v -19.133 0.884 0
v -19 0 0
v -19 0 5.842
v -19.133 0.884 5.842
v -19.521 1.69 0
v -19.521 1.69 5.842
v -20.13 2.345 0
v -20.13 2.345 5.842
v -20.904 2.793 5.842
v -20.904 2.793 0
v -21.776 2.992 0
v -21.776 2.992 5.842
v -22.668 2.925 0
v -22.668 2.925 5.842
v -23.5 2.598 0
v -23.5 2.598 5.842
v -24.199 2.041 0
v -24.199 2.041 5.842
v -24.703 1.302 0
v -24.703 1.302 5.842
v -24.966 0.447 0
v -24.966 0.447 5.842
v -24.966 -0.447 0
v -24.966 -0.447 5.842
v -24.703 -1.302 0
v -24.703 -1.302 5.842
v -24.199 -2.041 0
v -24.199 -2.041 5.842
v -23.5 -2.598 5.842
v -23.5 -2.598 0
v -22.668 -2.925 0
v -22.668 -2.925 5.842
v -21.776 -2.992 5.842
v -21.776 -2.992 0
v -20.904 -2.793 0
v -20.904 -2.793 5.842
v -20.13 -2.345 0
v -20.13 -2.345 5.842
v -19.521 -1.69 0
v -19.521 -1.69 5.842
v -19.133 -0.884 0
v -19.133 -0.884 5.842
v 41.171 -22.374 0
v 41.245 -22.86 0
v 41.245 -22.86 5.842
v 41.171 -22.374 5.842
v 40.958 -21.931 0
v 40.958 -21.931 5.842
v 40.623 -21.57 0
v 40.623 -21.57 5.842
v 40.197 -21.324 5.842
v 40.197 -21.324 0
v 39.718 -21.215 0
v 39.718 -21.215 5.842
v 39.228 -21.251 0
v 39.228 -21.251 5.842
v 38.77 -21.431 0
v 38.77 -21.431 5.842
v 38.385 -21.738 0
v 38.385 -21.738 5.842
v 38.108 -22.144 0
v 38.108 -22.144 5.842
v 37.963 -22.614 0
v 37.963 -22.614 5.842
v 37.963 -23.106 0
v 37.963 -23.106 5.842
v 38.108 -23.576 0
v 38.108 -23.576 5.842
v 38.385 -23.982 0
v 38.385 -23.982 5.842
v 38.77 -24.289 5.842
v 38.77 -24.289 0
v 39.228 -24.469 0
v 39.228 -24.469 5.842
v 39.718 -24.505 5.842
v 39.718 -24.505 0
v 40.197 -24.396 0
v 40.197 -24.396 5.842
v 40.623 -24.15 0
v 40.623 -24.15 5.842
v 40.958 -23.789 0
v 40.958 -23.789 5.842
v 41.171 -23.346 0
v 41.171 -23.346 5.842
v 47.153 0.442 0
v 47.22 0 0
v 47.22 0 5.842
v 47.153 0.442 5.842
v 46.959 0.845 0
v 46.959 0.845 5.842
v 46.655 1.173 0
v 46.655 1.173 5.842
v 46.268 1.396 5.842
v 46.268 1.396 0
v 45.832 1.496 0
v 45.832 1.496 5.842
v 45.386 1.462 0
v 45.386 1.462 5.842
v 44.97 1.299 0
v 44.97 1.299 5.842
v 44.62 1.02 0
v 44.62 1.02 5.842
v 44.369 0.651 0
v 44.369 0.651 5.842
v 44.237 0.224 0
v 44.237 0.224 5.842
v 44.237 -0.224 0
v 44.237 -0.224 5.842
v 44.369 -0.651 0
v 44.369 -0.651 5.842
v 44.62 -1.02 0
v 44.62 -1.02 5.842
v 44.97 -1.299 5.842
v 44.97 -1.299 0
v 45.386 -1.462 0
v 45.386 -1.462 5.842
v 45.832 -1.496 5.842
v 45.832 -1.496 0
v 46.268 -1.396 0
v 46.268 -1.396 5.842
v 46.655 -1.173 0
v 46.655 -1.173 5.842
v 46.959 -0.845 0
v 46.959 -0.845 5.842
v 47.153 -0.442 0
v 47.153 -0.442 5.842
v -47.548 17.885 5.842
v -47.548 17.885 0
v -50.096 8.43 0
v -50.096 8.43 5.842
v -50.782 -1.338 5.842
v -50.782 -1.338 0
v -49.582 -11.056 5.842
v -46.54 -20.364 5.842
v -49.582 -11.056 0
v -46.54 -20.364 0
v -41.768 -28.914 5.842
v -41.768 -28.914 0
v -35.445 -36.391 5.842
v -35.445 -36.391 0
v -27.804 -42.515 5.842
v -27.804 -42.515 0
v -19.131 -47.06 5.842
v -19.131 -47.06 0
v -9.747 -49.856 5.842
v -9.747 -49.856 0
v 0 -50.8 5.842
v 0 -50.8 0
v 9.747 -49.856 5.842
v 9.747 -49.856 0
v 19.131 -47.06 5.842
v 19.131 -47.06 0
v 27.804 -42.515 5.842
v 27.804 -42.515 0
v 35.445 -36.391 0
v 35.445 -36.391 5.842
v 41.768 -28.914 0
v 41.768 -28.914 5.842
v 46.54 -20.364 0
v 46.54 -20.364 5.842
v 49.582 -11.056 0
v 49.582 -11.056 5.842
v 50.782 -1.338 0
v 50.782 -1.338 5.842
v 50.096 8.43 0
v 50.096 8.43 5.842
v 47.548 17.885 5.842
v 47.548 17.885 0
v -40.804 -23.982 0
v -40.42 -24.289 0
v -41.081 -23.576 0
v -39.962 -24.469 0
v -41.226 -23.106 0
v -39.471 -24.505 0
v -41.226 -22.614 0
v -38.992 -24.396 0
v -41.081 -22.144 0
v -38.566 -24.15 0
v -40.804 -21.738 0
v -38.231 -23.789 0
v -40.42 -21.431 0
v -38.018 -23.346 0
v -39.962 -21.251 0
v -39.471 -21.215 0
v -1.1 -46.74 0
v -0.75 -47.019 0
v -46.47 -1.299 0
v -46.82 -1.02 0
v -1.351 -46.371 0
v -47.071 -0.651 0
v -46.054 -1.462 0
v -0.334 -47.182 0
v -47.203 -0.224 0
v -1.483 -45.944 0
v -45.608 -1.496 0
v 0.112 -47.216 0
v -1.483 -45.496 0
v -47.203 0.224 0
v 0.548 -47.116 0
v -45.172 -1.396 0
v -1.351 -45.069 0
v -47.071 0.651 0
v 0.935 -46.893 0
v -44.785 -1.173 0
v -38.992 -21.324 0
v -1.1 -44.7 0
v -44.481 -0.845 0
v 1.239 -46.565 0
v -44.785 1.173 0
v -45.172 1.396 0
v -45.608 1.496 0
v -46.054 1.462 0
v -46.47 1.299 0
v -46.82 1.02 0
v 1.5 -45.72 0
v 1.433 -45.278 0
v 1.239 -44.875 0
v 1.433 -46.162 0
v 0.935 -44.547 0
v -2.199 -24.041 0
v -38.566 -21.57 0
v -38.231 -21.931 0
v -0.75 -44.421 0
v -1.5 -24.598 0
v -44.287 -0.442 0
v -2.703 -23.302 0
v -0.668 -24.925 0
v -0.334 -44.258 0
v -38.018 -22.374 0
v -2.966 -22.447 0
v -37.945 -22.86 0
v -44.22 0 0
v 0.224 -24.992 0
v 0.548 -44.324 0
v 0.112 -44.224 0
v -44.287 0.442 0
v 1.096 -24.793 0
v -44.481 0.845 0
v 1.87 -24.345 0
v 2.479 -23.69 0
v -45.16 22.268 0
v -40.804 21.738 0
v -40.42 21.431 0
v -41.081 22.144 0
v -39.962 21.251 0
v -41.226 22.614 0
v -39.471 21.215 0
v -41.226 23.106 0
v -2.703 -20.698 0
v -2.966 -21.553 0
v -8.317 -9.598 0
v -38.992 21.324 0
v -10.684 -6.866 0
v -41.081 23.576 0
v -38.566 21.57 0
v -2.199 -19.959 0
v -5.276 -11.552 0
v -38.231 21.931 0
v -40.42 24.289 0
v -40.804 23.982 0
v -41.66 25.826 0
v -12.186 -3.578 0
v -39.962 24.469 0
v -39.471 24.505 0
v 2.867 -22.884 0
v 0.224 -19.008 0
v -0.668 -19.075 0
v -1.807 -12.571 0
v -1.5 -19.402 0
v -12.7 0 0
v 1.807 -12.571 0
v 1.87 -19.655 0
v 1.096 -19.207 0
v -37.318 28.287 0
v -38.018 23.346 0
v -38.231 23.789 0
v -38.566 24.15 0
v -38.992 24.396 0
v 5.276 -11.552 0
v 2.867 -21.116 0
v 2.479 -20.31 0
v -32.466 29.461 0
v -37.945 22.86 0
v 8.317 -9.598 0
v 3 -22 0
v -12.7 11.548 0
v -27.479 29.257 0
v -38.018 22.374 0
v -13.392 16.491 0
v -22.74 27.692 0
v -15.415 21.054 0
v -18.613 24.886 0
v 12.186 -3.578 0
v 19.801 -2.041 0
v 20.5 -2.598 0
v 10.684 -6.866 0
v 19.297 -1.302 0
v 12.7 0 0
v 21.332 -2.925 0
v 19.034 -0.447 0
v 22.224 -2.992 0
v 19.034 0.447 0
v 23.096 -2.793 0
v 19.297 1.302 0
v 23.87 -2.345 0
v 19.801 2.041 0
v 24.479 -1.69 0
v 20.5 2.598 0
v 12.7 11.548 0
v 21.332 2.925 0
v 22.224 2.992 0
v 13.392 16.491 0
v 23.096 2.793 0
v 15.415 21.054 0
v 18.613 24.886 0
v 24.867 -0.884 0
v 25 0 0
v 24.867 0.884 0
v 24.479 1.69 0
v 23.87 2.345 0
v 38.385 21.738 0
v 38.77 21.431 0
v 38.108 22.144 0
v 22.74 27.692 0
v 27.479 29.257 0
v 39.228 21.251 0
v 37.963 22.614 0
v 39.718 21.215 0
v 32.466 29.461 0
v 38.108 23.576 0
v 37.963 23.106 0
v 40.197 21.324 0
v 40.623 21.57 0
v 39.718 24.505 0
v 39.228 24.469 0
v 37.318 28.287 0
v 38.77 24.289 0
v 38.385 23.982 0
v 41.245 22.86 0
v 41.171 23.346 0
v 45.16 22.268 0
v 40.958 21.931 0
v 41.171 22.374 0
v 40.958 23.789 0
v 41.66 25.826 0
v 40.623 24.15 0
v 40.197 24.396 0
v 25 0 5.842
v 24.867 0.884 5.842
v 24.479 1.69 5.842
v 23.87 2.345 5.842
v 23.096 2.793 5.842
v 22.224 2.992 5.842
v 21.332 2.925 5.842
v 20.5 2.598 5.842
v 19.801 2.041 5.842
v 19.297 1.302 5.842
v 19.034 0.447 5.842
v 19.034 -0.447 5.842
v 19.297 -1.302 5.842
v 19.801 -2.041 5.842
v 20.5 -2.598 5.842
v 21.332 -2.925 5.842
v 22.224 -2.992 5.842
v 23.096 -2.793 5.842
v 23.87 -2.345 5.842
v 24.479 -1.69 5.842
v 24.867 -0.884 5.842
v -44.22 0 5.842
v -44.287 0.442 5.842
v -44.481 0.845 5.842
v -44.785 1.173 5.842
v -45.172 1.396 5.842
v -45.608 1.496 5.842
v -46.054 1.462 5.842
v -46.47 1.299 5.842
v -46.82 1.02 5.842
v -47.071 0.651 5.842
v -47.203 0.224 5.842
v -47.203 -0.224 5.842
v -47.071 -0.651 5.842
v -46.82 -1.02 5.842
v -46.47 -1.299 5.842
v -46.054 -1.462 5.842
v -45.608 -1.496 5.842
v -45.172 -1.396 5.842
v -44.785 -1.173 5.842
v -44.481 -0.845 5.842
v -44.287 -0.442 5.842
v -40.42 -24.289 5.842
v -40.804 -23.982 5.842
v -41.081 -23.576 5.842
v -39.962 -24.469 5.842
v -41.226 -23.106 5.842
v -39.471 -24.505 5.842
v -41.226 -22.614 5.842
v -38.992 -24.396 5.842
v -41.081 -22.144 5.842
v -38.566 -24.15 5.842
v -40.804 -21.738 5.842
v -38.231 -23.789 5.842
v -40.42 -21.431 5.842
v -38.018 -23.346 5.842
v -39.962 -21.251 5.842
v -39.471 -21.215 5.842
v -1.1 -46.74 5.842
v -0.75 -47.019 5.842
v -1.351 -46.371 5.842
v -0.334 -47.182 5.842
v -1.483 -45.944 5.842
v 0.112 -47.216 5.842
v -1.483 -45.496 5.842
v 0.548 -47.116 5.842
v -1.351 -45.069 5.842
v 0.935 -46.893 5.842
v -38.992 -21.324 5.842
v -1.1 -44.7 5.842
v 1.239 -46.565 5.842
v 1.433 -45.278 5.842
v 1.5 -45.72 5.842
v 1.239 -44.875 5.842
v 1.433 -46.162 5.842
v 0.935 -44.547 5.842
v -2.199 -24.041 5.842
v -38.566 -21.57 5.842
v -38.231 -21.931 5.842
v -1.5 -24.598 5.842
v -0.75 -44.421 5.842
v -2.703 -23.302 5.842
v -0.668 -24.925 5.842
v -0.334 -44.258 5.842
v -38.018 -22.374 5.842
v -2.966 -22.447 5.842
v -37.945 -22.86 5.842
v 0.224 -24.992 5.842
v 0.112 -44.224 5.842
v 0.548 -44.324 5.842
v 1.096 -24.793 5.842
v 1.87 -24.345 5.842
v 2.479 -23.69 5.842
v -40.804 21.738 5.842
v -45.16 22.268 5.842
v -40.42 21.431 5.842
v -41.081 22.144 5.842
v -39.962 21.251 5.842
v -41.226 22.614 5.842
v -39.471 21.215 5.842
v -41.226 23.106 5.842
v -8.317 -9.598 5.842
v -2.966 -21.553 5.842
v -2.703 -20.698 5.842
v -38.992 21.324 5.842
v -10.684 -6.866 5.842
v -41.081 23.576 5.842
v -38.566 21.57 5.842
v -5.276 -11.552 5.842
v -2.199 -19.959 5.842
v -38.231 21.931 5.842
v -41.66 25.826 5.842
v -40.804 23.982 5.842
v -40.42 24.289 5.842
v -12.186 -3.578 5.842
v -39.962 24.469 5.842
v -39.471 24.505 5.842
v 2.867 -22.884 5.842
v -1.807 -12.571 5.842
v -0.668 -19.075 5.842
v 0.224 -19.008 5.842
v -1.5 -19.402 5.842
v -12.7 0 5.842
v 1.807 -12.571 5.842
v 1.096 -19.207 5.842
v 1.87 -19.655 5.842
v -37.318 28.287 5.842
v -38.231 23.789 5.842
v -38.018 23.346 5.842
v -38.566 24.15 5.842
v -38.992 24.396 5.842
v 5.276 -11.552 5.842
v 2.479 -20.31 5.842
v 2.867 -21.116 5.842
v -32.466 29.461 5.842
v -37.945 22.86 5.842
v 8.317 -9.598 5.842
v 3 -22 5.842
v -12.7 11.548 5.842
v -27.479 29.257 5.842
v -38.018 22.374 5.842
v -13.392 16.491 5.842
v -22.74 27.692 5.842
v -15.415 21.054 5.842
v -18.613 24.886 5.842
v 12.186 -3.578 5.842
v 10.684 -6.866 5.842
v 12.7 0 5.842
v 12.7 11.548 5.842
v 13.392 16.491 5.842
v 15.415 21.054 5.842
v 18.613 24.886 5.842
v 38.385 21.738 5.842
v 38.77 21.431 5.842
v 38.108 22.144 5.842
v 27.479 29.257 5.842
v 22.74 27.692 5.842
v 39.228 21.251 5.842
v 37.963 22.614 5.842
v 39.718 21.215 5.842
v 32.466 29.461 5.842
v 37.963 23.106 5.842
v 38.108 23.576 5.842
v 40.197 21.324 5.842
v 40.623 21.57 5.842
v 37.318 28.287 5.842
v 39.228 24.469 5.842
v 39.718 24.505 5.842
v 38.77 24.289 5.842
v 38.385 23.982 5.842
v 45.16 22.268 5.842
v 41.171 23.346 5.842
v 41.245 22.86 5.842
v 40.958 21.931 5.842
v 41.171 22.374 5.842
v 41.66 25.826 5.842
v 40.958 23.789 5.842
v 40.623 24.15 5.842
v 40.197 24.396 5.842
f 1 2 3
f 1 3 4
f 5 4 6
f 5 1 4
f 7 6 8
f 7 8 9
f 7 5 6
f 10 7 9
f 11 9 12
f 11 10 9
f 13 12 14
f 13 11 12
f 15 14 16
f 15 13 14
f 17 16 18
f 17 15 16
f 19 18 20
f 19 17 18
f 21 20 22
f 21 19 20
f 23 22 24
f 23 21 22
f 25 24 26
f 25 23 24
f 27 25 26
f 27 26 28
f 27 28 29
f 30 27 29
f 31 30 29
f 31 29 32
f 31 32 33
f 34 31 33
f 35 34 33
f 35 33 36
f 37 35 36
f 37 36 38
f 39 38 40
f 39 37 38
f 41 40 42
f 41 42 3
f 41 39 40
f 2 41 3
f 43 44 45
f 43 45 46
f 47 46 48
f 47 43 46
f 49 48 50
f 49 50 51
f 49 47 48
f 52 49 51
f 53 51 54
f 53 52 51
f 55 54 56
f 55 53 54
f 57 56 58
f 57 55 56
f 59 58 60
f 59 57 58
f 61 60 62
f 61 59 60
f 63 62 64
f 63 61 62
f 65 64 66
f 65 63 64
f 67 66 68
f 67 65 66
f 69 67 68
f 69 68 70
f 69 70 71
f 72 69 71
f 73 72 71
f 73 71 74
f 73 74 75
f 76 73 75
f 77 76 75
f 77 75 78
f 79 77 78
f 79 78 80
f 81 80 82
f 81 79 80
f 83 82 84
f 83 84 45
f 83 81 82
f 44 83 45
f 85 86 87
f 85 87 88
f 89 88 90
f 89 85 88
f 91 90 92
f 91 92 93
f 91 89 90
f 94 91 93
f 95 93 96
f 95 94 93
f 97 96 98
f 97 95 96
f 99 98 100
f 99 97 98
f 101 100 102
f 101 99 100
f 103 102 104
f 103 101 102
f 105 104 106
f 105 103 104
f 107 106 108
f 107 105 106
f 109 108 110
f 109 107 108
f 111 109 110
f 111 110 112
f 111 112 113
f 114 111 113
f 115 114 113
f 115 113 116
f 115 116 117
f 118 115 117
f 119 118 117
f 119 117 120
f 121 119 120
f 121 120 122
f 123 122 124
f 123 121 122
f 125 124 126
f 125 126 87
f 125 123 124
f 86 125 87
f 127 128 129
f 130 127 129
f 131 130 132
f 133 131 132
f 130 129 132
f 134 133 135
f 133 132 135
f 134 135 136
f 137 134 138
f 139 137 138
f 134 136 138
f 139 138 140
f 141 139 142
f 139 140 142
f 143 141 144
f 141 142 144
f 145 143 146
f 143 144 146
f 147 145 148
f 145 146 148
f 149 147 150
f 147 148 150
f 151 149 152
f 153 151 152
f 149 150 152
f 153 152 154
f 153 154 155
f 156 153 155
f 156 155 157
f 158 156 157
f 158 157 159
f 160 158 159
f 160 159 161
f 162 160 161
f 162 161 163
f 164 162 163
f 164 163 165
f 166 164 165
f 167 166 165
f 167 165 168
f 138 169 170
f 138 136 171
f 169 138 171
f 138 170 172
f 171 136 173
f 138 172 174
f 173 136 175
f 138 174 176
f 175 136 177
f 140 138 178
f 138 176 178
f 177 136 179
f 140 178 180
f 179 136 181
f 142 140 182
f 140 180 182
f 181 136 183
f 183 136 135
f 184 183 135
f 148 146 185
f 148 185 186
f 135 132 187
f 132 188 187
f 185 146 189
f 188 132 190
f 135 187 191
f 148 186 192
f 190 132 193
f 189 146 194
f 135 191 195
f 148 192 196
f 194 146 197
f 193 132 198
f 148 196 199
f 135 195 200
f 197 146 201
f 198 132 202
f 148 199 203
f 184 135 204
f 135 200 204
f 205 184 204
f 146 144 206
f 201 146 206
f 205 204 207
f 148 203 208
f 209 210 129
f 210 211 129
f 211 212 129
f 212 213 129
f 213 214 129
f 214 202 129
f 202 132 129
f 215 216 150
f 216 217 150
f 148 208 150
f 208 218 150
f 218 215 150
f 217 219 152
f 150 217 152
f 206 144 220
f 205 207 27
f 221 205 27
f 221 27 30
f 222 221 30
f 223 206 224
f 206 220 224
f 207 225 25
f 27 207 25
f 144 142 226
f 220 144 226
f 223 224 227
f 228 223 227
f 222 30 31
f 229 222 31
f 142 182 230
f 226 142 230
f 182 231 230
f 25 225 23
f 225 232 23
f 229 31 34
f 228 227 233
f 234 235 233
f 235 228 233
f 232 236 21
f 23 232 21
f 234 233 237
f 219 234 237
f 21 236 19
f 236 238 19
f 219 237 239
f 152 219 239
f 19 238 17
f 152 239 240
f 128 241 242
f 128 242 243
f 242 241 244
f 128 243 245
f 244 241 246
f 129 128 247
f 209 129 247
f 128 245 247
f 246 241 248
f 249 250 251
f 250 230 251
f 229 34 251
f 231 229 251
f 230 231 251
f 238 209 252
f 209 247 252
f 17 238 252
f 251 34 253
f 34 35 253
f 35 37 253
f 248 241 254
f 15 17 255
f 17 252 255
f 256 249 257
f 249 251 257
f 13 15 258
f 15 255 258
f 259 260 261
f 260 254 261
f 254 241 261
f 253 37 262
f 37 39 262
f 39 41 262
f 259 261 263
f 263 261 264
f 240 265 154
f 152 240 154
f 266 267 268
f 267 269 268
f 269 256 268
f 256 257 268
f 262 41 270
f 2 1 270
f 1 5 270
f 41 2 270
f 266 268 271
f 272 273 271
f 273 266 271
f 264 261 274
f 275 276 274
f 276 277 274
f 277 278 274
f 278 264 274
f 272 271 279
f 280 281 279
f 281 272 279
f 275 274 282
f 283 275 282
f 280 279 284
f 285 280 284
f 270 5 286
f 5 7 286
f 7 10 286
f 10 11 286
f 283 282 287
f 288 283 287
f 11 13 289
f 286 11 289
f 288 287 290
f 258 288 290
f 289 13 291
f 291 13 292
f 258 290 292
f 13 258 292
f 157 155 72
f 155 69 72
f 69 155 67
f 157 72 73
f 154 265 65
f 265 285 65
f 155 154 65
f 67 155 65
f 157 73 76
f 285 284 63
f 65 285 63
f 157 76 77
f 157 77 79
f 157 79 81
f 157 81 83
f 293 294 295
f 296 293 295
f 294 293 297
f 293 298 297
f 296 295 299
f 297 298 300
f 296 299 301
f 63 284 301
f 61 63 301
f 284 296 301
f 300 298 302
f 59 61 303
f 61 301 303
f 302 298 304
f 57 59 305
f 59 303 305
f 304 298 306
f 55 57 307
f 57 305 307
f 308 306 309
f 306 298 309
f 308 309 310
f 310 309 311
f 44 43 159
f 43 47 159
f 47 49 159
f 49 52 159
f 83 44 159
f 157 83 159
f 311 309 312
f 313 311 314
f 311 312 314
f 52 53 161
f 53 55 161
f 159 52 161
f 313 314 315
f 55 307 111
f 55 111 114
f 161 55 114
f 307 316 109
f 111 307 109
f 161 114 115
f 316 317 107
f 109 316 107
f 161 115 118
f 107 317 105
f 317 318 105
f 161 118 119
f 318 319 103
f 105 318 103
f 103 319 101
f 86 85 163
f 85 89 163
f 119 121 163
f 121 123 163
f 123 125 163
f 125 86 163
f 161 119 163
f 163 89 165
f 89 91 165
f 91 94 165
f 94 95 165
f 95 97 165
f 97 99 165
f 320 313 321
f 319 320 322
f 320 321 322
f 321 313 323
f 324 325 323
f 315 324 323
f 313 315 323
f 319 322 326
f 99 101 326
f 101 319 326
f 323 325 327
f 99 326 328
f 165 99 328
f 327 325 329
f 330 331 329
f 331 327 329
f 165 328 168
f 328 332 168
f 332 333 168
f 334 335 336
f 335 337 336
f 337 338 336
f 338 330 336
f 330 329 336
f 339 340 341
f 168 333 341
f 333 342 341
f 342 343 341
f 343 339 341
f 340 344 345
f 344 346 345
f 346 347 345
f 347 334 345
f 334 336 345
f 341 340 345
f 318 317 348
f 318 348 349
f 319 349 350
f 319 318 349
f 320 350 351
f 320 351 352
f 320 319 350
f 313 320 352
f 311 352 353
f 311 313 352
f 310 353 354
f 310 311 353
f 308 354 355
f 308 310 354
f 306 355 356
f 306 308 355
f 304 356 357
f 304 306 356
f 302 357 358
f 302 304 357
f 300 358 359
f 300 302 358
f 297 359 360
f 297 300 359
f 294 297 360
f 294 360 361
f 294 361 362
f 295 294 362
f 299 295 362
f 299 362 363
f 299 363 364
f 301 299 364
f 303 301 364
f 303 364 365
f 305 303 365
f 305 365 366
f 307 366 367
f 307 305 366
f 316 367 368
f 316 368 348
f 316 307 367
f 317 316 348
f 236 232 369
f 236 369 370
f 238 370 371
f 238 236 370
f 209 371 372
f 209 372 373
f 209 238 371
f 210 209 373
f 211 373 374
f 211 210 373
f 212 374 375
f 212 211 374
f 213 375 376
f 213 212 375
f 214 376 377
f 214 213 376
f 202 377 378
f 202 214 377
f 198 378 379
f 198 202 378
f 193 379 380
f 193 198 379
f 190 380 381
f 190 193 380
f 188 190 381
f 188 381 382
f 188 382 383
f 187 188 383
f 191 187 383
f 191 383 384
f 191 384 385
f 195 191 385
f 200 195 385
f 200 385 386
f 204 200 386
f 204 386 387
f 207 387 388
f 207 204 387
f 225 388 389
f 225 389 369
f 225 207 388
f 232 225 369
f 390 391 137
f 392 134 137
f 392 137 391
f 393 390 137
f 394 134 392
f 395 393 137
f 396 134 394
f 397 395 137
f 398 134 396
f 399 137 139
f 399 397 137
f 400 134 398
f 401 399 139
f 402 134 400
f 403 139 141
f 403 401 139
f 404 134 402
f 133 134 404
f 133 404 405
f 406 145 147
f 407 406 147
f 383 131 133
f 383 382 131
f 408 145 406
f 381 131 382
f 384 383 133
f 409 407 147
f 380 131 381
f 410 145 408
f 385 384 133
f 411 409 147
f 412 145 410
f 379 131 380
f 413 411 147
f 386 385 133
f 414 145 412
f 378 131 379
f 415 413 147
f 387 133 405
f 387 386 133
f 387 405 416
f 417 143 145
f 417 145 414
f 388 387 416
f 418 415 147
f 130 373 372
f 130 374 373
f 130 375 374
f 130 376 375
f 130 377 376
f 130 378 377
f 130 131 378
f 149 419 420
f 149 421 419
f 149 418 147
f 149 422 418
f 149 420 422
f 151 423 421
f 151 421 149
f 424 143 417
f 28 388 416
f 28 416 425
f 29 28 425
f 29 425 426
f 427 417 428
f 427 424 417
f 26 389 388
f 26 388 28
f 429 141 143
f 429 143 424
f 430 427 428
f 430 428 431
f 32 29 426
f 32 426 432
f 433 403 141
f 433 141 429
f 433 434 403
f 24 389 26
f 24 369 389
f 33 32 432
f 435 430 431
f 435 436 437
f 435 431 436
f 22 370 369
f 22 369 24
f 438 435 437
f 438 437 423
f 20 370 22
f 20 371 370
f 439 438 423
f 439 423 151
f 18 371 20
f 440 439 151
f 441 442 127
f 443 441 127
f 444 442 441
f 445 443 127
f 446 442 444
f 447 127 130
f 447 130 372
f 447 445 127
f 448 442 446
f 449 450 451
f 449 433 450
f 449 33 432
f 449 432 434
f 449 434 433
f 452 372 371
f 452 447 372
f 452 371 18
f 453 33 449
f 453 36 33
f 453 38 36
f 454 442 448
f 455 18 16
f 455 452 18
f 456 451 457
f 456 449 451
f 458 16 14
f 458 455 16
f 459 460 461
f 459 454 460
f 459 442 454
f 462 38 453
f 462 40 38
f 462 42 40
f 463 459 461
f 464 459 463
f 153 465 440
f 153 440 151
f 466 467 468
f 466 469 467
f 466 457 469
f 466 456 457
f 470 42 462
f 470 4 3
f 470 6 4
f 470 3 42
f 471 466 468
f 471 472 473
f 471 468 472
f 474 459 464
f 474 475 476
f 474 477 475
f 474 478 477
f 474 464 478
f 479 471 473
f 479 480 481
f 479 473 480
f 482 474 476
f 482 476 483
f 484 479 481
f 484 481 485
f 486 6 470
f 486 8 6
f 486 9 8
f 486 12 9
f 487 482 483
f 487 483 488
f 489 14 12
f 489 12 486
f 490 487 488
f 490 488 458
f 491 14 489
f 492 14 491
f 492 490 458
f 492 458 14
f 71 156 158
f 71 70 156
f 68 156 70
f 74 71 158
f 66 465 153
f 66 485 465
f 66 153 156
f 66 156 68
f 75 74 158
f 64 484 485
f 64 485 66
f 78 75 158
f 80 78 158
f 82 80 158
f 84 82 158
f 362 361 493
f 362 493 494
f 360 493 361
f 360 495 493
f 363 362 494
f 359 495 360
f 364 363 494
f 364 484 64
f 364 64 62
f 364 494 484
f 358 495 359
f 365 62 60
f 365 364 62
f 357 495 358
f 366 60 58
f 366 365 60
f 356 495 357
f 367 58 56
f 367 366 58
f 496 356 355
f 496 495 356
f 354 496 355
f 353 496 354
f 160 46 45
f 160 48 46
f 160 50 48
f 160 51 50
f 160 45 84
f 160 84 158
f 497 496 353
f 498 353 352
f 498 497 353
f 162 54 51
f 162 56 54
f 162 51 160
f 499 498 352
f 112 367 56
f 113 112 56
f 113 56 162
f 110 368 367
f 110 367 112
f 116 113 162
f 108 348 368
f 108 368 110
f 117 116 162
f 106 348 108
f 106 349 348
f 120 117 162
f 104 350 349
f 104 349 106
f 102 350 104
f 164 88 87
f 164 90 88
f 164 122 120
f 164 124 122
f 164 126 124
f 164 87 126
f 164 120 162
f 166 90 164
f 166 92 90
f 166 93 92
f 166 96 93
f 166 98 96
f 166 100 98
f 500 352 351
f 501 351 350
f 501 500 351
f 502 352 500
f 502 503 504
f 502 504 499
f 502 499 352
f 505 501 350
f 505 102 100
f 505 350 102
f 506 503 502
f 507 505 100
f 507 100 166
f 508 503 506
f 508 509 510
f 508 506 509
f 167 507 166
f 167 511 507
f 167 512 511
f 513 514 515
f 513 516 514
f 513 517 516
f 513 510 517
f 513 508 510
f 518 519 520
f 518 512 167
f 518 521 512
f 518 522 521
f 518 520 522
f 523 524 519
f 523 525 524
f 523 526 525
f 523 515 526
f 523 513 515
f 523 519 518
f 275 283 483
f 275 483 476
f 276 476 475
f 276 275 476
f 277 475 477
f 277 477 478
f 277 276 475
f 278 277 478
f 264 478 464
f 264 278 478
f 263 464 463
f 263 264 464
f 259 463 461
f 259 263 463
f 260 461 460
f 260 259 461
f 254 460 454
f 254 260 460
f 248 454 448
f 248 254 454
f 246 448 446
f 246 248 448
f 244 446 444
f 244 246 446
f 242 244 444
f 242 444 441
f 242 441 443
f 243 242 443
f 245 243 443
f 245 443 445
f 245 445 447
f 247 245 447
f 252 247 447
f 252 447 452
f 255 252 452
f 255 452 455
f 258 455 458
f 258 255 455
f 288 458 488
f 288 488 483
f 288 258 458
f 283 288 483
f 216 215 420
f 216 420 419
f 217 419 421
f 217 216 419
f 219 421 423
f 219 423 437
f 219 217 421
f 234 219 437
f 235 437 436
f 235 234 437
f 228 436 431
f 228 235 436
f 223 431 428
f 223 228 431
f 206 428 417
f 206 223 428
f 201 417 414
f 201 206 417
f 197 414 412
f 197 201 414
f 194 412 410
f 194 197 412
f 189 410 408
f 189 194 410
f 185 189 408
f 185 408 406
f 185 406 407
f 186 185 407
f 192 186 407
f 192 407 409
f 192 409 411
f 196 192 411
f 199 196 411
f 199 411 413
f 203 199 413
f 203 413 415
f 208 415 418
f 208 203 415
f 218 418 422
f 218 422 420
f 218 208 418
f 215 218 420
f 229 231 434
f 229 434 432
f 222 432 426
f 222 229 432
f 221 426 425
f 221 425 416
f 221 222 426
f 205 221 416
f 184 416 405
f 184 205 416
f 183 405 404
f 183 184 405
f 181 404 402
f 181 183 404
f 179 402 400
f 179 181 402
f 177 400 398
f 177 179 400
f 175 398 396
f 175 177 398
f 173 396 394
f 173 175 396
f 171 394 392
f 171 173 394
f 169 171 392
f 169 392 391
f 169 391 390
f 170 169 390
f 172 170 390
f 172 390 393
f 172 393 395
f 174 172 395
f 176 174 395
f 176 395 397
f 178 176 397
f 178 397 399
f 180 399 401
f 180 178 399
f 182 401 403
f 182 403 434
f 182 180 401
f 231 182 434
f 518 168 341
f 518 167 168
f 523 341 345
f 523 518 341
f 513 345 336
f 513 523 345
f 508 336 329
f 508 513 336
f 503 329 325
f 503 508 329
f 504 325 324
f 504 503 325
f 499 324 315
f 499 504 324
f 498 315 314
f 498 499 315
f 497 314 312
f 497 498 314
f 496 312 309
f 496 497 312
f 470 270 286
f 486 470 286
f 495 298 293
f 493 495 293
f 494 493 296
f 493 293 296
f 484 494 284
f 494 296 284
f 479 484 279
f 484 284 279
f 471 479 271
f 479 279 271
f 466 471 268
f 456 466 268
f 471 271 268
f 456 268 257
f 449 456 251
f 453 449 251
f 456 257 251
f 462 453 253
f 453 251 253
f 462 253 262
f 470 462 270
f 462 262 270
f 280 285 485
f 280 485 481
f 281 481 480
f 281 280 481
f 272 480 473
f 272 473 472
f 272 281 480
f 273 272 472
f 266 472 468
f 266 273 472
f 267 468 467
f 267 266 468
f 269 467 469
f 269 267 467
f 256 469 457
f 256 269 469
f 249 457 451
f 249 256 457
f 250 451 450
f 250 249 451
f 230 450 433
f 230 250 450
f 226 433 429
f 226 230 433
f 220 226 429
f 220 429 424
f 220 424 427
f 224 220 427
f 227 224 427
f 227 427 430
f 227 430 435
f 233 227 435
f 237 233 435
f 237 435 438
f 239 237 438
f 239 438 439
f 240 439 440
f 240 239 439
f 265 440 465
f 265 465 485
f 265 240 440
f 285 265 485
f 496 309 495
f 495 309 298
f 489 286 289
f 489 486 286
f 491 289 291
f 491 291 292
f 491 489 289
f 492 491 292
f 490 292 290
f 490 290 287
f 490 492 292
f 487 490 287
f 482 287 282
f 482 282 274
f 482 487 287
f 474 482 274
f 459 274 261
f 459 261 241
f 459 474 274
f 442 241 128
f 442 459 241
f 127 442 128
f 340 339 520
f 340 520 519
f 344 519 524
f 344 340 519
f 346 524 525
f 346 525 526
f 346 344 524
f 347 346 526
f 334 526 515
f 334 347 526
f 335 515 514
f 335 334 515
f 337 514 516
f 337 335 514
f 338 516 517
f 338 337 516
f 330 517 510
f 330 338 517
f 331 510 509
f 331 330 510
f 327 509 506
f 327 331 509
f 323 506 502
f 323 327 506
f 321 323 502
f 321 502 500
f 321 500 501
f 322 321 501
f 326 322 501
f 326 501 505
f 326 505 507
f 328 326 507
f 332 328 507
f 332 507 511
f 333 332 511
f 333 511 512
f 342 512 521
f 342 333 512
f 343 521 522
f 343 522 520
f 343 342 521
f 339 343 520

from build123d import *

# Parameters (mm, degrees)
SKETCH1_R           = 3
SKETCH1_R_2         = 1.5
SKETCH1_R_3         = 1.65
BOSS_EXTRUDE1_DEPTH = 5.842
FILLET1_R           = 18


with BuildPart() as part:
    # Sketch1 → Boss-Extrude1 (new body)
    with BuildSketch(Plane.XY):
        with BuildLine():
            Line((-12.7, 0), (-12.7, 49.186888497))
            ThreePointArc((-12.7, 49.186888497), (0, -50.8), (12.7, 49.186888497))
            Line((12.7, 49.186888497), (12.7, 0))
            ThreePointArc((12.7, 0), (0, -12.7), (-12.7, 0))
        make_face()
        with Locations((22, 0)):
            Circle(SKETCH1_R, mode=Mode.SUBTRACT)
        with Locations((0, -22)):
            Circle(SKETCH1_R, mode=Mode.SUBTRACT)
        with Locations((-22, 0)):
            Circle(SKETCH1_R, mode=Mode.SUBTRACT)
        with Locations((-45.72, 0)):
            Circle(SKETCH1_R_2, mode=Mode.SUBTRACT)
        with Locations((45.72, 0)):
            Circle(SKETCH1_R_2, mode=Mode.SUBTRACT)
        with Locations((0, -45.72)):
            Circle(SKETCH1_R_2, mode=Mode.SUBTRACT)
        with Locations((39.594681461, 22.86)):
            Circle(SKETCH1_R_3, mode=Mode.SUBTRACT)
        with Locations((39.594681461, -22.86)):
            Circle(SKETCH1_R_3, mode=Mode.SUBTRACT)
        with Locations((-39.594681461, -22.86)):
            Circle(SKETCH1_R_3, mode=Mode.SUBTRACT)
        with Locations((-39.594681461, 22.86)):
            Circle(SKETCH1_R_3, mode=Mode.SUBTRACT)
    extrude(amount=BOSS_EXTRUDE1_DEPTH)

    # Fillet1
    fillet1_edges = [part.edges().sort_by_distance(p)[0] for p in [
        (12.7, 49.186888497, 2.921),
        (-12.7, 49.186888497, 2.921),
    ]]
    fillet(fillet1_edges, radius=FILLET1_R)


solid = part.part
